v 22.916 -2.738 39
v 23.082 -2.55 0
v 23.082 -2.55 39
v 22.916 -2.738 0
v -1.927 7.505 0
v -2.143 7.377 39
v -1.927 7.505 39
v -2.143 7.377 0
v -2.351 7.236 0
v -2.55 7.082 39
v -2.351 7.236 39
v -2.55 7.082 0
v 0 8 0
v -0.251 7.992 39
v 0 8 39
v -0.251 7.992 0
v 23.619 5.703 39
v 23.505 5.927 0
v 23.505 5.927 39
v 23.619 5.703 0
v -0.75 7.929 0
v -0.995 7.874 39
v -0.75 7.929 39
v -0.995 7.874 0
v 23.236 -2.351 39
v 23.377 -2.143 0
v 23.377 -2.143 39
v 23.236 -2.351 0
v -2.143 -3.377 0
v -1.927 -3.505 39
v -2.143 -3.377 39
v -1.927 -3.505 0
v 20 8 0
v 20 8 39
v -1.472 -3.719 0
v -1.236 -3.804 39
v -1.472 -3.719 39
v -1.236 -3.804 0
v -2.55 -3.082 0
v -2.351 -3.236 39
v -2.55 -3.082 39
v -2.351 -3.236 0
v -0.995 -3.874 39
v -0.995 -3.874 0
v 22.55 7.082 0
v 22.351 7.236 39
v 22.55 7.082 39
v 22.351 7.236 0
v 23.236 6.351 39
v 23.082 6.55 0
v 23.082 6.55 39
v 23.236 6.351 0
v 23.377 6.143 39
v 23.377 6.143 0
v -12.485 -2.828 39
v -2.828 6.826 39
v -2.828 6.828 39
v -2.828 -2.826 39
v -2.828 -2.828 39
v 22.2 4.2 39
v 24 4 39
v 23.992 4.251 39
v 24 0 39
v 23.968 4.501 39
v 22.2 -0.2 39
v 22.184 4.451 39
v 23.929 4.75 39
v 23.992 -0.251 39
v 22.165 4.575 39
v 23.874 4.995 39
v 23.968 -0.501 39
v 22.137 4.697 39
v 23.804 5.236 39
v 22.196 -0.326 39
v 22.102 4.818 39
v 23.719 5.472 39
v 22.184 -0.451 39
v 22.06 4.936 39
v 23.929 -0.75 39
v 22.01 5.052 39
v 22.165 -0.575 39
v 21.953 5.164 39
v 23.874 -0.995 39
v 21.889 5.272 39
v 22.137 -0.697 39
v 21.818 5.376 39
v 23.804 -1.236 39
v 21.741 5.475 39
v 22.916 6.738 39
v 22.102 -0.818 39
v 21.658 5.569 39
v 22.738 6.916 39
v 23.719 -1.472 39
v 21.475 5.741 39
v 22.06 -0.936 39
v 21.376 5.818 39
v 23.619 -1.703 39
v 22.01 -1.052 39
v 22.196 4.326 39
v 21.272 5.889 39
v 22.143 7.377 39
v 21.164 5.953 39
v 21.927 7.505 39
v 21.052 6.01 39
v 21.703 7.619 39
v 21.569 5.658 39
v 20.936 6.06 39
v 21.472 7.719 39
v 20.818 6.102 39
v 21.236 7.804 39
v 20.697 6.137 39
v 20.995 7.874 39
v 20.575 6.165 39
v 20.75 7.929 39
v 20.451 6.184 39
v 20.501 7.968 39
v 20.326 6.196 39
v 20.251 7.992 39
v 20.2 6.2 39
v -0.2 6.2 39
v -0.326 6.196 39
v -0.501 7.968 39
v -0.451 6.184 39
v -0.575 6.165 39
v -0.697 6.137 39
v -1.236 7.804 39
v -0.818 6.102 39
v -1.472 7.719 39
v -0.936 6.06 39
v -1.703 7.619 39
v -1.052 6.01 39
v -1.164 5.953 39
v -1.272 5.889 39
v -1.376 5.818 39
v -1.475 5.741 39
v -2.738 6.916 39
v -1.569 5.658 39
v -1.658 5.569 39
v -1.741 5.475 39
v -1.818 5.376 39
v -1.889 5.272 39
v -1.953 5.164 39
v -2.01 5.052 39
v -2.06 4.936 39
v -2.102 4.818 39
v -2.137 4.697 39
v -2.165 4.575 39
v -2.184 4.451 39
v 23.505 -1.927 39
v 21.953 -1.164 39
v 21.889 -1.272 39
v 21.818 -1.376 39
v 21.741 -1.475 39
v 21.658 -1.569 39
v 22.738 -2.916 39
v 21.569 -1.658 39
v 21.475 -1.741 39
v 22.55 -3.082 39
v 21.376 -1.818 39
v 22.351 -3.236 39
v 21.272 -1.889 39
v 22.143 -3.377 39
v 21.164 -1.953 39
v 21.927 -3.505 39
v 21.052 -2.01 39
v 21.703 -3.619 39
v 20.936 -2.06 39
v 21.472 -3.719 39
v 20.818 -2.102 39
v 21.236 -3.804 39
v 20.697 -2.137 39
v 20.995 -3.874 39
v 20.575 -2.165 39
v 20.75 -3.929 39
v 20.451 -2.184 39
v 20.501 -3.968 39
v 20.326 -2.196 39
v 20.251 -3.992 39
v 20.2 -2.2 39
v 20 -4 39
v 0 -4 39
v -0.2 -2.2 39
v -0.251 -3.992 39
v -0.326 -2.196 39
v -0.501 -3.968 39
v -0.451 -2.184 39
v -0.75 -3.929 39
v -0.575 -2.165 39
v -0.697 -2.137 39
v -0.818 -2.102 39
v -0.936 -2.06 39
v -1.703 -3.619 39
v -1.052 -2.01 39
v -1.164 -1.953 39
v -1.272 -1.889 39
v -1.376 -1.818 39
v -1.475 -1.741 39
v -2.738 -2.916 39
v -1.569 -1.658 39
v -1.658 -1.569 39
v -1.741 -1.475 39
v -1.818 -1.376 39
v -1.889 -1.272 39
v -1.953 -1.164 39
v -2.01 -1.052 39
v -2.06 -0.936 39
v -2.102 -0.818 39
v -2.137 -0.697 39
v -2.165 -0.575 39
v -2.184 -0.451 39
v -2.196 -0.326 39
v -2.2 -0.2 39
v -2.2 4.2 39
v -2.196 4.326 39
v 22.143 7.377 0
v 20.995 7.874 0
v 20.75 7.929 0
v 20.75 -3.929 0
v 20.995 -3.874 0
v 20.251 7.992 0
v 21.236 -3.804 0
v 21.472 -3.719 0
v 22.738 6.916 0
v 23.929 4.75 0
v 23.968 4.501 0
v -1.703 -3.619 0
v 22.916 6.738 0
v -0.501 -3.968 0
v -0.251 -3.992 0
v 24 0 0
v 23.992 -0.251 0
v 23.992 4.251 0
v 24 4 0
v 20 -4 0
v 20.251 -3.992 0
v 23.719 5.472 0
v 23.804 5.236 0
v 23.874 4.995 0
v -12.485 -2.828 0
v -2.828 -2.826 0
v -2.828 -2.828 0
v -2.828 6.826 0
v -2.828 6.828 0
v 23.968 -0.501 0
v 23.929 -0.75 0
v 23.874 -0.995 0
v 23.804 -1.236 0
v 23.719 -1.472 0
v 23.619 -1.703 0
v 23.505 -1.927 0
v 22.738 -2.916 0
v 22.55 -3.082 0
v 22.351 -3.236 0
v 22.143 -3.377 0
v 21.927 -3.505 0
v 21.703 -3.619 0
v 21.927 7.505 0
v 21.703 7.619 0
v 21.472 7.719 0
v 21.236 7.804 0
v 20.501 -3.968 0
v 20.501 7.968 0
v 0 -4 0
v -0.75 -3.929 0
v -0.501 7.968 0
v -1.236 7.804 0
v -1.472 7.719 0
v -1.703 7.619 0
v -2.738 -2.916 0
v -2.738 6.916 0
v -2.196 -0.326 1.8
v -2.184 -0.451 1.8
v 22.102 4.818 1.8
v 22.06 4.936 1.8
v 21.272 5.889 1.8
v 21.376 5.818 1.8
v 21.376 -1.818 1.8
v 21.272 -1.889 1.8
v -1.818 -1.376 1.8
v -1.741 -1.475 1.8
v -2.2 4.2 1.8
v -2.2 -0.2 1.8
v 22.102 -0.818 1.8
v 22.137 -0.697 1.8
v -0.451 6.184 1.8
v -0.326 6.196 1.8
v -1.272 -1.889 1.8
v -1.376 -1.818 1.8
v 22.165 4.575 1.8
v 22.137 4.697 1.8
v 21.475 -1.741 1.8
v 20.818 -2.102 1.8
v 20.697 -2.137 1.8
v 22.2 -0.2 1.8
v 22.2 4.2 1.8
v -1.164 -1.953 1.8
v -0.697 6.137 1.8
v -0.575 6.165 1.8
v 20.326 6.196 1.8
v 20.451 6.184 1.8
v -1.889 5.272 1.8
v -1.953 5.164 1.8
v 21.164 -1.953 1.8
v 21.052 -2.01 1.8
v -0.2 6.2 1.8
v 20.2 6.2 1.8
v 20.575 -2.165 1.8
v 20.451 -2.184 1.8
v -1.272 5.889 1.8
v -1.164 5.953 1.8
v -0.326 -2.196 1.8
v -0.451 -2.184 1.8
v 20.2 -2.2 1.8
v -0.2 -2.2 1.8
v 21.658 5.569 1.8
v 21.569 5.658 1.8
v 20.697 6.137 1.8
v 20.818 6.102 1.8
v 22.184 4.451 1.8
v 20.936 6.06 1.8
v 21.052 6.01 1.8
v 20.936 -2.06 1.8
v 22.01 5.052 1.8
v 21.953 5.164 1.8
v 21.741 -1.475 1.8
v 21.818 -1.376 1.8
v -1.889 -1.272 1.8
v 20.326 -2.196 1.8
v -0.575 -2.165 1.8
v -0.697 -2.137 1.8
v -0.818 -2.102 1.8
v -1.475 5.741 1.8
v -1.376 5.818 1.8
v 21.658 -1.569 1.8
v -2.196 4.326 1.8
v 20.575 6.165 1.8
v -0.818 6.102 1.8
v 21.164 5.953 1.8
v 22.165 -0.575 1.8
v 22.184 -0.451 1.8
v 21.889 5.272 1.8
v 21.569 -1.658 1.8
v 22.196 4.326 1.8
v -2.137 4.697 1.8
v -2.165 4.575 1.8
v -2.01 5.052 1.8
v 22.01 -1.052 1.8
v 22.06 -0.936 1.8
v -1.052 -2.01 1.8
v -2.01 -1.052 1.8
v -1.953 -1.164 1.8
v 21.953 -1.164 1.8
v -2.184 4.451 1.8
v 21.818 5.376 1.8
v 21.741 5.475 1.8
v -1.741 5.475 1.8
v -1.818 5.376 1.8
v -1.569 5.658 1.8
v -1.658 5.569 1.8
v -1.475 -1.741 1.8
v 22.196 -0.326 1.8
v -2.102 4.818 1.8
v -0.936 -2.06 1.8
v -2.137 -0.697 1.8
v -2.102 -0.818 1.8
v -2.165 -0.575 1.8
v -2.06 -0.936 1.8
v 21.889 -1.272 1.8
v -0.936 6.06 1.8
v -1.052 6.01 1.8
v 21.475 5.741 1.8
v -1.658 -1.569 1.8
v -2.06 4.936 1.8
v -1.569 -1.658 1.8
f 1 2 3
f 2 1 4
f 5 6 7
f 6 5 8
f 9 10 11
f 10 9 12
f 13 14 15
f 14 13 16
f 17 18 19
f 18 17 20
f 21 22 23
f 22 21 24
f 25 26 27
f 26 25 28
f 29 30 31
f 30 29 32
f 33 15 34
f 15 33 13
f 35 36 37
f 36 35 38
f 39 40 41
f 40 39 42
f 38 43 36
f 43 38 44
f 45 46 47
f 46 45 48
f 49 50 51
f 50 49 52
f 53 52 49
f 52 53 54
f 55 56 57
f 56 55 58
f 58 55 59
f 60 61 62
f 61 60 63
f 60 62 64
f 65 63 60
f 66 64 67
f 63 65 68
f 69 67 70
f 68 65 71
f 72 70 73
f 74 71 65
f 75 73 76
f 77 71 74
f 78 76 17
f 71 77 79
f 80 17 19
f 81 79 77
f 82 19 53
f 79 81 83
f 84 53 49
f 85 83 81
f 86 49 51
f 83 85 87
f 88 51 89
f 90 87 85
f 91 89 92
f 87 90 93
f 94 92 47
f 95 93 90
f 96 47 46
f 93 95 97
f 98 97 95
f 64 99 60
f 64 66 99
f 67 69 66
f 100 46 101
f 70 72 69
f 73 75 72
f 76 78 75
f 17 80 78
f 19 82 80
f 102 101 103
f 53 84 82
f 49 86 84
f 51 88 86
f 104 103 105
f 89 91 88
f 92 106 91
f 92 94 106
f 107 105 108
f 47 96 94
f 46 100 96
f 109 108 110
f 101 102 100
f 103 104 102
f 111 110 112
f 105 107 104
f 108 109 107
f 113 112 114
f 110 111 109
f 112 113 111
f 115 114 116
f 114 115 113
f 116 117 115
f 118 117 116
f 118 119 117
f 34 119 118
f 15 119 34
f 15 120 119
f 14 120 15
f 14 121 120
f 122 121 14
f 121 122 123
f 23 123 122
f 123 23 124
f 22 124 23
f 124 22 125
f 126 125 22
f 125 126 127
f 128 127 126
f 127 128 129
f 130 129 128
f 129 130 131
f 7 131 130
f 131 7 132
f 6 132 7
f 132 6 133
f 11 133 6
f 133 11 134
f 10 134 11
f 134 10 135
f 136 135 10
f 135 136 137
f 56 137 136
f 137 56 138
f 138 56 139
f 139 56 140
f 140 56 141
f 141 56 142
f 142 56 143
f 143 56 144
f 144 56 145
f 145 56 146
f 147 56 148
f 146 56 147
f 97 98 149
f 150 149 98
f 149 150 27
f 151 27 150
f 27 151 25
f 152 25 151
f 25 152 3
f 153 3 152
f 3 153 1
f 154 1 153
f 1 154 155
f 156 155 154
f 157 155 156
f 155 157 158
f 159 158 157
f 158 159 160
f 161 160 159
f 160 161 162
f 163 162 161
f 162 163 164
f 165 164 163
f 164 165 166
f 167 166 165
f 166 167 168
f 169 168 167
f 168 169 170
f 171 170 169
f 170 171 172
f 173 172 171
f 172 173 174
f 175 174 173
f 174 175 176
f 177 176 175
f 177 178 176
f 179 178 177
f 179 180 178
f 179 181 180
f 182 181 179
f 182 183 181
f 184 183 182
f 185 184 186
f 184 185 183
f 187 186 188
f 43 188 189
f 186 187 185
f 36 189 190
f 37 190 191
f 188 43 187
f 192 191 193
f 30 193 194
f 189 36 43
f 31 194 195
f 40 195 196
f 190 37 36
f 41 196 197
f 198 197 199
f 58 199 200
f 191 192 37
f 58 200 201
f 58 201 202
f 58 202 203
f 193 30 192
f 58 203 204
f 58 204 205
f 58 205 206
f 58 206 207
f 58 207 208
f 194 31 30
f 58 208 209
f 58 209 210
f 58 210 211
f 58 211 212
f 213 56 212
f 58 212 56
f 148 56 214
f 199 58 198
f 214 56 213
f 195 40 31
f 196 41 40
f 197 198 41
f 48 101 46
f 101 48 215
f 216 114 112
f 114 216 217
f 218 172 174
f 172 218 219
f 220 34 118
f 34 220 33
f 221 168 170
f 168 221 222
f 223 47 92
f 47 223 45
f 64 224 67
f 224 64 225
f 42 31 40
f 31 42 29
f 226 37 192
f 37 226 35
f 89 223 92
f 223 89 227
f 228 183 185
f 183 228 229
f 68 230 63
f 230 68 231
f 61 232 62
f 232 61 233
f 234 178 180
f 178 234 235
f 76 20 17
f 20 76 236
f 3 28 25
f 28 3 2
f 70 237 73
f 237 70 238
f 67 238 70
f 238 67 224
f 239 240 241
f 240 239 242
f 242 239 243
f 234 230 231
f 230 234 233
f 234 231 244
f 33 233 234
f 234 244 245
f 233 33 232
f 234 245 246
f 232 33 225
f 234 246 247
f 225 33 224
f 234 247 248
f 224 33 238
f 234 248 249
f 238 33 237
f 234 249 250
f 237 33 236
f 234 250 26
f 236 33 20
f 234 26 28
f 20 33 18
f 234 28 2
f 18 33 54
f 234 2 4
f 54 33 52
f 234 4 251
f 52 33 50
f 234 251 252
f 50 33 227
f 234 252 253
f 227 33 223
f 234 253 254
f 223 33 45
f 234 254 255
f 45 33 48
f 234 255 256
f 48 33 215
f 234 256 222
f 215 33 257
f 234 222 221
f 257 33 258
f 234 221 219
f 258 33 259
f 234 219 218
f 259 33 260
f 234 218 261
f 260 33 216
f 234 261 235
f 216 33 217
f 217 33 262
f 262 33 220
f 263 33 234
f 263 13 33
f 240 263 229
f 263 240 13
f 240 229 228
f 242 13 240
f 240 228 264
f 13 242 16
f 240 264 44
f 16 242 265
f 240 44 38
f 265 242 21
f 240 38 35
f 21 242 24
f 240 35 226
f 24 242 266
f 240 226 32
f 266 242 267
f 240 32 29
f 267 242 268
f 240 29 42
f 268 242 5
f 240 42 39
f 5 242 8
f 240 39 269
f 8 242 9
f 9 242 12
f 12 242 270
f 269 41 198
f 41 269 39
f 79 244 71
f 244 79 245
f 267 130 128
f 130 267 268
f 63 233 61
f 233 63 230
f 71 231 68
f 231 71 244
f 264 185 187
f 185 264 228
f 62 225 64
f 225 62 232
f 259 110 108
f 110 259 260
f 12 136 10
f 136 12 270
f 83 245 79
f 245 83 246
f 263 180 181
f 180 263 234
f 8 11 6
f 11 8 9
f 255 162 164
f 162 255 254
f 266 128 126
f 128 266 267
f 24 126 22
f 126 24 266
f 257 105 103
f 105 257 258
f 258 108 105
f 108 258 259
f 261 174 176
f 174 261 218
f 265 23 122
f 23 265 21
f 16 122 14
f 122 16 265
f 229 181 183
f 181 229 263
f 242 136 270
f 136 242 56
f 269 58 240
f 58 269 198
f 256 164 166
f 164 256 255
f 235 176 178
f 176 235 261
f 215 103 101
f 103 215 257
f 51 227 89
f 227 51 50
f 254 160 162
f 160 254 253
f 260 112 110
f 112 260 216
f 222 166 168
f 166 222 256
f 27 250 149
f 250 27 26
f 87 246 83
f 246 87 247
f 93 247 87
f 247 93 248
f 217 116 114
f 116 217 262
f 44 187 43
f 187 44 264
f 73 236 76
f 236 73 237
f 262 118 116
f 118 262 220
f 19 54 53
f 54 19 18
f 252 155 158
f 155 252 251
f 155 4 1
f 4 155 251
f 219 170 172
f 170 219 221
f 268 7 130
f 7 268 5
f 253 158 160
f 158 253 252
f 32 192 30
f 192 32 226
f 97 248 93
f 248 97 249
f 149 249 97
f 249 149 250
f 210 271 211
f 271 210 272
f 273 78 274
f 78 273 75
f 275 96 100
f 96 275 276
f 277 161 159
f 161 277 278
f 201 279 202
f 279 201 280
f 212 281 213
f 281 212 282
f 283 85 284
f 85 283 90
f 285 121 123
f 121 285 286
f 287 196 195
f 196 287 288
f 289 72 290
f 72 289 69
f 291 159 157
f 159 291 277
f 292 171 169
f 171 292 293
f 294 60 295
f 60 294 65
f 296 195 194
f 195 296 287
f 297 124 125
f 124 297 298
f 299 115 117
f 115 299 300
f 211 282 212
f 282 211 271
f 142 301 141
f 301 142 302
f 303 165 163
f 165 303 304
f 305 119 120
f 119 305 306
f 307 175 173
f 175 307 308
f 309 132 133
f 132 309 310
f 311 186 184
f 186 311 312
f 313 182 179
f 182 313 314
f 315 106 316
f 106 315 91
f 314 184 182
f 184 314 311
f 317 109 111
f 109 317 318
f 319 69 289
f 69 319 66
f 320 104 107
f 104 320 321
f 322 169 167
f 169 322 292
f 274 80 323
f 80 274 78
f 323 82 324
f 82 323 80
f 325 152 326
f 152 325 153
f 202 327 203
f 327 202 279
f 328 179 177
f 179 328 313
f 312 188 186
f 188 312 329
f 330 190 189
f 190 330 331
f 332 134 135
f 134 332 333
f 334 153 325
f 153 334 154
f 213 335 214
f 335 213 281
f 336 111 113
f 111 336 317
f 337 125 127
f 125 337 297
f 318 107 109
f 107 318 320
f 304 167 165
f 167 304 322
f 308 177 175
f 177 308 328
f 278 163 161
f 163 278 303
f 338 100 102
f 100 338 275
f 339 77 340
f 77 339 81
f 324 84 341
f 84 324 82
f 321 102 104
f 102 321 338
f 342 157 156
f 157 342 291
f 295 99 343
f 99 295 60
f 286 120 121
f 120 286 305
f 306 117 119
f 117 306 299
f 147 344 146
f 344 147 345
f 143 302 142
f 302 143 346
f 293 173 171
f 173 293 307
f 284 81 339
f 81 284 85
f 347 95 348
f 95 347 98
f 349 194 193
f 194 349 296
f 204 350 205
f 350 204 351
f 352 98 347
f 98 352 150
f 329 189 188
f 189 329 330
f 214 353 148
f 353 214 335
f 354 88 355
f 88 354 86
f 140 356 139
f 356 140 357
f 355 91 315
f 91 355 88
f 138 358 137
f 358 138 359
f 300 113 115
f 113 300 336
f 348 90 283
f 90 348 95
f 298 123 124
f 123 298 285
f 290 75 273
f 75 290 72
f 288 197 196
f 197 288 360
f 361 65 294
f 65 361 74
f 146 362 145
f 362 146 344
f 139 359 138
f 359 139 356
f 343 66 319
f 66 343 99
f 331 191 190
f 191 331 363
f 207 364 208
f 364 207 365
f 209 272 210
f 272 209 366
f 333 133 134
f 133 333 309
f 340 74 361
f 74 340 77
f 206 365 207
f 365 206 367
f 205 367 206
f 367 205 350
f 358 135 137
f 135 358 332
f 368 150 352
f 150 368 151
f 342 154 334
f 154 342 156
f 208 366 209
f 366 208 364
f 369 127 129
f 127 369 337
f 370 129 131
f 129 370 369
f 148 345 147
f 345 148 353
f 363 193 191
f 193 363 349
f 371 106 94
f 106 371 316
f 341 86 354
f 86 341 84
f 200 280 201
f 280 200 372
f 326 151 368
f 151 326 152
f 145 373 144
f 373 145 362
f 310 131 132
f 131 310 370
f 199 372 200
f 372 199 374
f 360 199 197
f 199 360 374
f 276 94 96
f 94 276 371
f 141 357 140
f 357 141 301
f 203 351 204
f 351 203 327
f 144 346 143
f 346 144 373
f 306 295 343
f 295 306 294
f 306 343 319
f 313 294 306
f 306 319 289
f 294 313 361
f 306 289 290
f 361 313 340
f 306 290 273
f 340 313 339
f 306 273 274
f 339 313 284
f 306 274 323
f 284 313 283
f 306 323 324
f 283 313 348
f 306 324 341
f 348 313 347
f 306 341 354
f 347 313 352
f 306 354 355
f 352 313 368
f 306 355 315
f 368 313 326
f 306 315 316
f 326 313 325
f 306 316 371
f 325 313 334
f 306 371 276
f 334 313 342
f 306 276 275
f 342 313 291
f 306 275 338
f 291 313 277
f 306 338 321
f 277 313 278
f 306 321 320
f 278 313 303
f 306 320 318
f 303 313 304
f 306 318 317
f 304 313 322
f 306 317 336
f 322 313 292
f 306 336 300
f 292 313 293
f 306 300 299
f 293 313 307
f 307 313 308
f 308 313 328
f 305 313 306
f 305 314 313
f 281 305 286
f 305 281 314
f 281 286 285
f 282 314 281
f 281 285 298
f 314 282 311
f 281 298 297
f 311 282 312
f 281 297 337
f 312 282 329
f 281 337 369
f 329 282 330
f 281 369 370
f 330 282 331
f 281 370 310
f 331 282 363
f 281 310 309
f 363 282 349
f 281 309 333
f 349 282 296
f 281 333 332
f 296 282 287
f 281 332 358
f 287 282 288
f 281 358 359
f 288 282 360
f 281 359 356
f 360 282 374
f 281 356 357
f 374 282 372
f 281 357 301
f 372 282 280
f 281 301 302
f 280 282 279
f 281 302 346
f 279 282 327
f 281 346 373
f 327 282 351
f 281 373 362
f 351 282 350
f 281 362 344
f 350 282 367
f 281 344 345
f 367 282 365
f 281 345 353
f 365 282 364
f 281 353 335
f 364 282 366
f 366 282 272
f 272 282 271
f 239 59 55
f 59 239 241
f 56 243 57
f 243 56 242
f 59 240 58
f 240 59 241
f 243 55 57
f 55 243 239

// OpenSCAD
// 9v battery battery box
//34567891123456789212345678931234567894123456789512345678961234567897123456789
$fn = 100;

module BoxSDreader(l=24, w=8.0, h=39, ws=2.0, r=4.0, t=0.2,
        taperR=false, taperL=true) {
    // Rounded box with open top, sized for the average 9v battery
    // t is tolerance; extra room for the battery to slide in
    // taperR and taperL will give a 45 degree ramp to print without overhangs
    //  if needed after rotation
    union() {
        difference() {
            hull() {
                cylinder(h=h, r=r, center=false);
                translate([0,w-2*(r-ws),0])
                    cylinder(h=h, r=r, center=false);
                translate([l-2*(r-ws),w-2*(r-ws),0])
                    cylinder(h=h, r=r, center=false);
                translate([l-2*(r-ws),0,0])
                    cylinder(h=h, r=r, center=false);
            }
            hull() {
                translate([-t,-t,ws-t])
                    cylinder(h=h*2, r=r-ws, center=false);
                translate([-t,(w-2*(r-ws))+t,ws-t])
                    cylinder(h=h*2, r=r-ws, center=false);
                translate([(l-2*(r-ws))+t,(w-2*(r-ws))+t,ws-t])
                    cylinder(h=h*2, r=r-ws, center=false);
                translate([(l-2*(r-ws))+t,-t,ws-t])
                    cylinder(h=h*2, r=r-ws, center=false);
            }
        }
        if(taperR) {
            linear_extrude(height=h, center=false, convexity=5, twist=0) {
                polygon( points=[
                    [l-2*(r-ws)+sqrt(r*r/2),(w-2*(r-ws))+sqrt(r*r/2)],
                    [l-2*(r-ws)+((w-2*(r-ws))+3*sqrt(r*r/2)),-sqrt(r*r/2)],
                    [l-2*(r-ws)+sqrt(r*r/2),-sqrt(r*r/2)],
                    [l-2*(r-ws)+sqrt(r*r/2),(w-2*(r-ws))+sqrt(r*r/2)]]);
            }
        }
        if(taperL) {
            linear_extrude(height=h, center=false, convexity=5, twist=0) {
                polygon( points=[[-sqrt(r*r/2),(w-2*(r-ws))+sqrt(r*r/2)],
                    [-((w-2*(r-ws))+3*sqrt(r*r/2)),-sqrt(r*r/2)],
                    [-sqrt(r*r/2),-sqrt(r*r/2)],
                    [-sqrt(r*r/2),(w-2*(r-ws))+sqrt(r*r/2)]]);
            }
        }
    }
}

BoxSDreader();
